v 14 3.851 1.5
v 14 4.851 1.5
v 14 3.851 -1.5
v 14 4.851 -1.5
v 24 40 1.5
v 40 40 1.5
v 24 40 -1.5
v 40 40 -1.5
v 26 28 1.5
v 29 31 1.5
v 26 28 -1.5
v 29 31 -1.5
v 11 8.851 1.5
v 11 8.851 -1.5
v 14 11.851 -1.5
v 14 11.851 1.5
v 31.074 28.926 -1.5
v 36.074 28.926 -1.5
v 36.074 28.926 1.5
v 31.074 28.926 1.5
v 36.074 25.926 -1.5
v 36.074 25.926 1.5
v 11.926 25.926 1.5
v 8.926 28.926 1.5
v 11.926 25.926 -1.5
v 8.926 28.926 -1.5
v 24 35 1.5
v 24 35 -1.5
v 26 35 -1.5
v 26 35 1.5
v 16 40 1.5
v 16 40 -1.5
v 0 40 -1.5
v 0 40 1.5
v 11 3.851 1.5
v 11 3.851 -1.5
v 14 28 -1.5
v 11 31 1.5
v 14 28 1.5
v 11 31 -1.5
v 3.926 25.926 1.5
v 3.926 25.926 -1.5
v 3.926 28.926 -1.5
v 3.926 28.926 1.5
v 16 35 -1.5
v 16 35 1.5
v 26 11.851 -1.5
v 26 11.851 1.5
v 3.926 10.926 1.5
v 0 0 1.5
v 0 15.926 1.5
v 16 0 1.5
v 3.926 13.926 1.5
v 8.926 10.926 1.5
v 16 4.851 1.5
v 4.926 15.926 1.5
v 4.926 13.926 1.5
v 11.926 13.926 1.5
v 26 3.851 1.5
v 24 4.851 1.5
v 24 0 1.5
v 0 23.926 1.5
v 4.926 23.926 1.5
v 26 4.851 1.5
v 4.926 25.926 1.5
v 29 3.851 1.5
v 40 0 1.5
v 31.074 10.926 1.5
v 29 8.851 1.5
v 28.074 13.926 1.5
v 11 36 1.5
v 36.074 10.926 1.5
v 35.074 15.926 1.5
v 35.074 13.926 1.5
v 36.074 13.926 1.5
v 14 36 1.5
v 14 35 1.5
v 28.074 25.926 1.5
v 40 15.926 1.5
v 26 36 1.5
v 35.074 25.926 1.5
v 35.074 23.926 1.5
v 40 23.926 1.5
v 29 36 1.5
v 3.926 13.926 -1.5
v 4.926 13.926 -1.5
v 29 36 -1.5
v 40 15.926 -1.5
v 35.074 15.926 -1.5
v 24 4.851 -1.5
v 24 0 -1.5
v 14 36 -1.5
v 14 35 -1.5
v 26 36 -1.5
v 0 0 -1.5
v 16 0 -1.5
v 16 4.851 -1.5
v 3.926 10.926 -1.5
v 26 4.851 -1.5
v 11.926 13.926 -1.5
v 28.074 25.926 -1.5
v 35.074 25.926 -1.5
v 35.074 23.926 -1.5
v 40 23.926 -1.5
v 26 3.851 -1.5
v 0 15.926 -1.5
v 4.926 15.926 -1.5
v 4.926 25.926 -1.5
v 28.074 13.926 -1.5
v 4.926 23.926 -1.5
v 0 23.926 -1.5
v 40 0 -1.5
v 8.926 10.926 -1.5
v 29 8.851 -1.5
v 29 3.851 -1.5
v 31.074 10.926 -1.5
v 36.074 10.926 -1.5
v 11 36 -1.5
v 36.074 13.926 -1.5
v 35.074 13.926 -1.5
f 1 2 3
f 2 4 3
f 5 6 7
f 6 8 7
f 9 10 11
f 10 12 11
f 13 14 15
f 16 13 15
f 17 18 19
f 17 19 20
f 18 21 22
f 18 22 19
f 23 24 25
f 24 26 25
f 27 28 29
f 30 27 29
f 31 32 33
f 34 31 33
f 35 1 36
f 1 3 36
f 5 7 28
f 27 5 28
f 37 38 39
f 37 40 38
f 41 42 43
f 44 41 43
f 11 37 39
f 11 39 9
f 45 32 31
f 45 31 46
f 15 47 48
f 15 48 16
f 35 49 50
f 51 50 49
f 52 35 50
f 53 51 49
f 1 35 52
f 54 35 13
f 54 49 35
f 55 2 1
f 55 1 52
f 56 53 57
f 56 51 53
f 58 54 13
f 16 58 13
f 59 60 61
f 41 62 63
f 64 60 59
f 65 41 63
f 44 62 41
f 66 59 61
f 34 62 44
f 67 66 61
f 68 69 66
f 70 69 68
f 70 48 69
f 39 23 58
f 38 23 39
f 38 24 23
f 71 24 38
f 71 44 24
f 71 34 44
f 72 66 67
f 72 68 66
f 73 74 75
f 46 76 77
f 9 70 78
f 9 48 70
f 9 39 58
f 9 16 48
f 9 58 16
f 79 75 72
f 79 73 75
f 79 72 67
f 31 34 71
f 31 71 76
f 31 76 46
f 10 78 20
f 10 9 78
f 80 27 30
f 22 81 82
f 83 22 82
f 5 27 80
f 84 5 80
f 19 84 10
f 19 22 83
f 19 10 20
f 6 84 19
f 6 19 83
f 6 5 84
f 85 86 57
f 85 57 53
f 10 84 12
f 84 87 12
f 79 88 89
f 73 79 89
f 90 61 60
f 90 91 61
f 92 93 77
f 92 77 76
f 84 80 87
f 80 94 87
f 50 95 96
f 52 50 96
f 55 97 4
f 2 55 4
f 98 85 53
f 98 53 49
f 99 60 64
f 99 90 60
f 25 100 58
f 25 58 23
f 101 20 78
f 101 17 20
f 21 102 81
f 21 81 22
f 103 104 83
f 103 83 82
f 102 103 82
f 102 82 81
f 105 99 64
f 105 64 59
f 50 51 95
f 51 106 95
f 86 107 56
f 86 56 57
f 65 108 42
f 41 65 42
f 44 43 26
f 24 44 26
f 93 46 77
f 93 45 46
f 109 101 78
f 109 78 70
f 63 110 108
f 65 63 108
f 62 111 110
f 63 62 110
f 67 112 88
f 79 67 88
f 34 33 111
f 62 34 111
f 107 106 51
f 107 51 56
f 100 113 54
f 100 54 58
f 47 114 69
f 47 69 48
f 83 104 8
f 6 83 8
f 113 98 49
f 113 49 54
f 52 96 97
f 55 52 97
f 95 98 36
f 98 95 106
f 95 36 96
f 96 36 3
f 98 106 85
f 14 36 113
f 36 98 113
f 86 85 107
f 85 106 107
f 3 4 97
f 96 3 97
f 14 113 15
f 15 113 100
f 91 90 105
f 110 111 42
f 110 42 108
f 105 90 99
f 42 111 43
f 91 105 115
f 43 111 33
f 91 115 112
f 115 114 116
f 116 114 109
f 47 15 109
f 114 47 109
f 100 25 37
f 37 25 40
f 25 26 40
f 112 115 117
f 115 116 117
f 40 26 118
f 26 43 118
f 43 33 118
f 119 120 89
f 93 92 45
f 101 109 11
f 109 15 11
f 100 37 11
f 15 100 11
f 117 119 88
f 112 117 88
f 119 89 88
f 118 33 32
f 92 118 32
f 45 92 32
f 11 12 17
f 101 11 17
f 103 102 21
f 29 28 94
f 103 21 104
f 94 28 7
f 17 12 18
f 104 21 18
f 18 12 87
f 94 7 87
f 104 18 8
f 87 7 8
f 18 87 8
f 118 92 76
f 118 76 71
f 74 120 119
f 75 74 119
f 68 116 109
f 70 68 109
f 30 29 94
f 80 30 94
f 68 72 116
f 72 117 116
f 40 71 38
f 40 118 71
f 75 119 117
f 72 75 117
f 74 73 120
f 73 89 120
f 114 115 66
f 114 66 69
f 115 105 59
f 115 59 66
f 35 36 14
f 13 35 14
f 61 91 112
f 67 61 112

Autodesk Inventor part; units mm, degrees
ref_plane "YZ Plane" through (0, 0, 0) normal (1, 0, 0) x (0, 1, 0)
ref_plane "XZ Plane" through (0, 0, 0) normal (0, 1, 0) x (-1, 0, 0)
ref_plane "XY Plane" through (0, 0, 0) normal (0, 0, 1) x (1, 0, 0)
sketch "스케치1" plane through (0, 0, 0) normal (0, 0, 1) x (1, 0, 0)
  line L0 (40, 40) -> (25, 40)
  line L1 (15, 40) -> (0, 40)
  line L2 (16, 40) -> (16, 35)
  line L3 (16, 35) -> (14, 35)
  line L4 (14, 35) -> (14, 36)
  line L5 (14, 36) -> (11, 36)
  line L6 (11, 36) -> (11, 31)
  line L7 (11, 31) -> (14, 28)
  line L8 (11, 31) -> (20.81, 31) construction
  line L9 (14, 28) -> (20, 28)
  line L10 (24, 40) -> (24, 35)
  line L11 (24, 35) -> (26, 35)
  line L12 (26, 35) -> (26, 36)
  line L13 (26, 36) -> (29, 36)
  line L14 (29, 36) -> (29, 31)
  line L15 (29, 31) -> (26, 28)
  line L16 (29, 31) -> (19.19, 31) construction
  line L17 (26, 28) -> (20, 28)
  line L18 (-0.0744, 15.9256) -> (4.9256, 15.9256)
  line L19 (-0.0744, 23.9256) -> (4.9256, 23.9256)
  line L20 (4.9256, 23.9256) -> (4.9256, 25.9256)
  line L21 (11.9256, 25.9256) -> (11.9256, 19.9256)
  line L22 (8.9256, 28.9256) -> (8.9256, 19.1155) construction
  line L23 (8.9256, 28.9256) -> (11.9256, 25.9256)
  line L24 (3.9256, 28.9256) -> (8.9256, 28.9256)
  line L25 (3.9256, 25.9256) -> (3.9256, 28.9256)
  line L26 (4.9256, 25.9256) -> (3.9256, 25.9256)
  line L27 (4.9256, 15.9256) -> (4.9256, 13.9256)
  line L28 (11.9256, 13.9256) -> (11.9256, 19.9256)
  line L29 (4.9256, 13.9256) -> (3.9256, 13.9256)
  line L30 (8.9256, 10.9256) -> (11.9256, 13.9256)
  line L31 (8.9256, 10.9256) -> (8.9256, 20.7356) construction
  line L32 (3.9256, 13.9256) -> (3.9256, 10.9256)
  line L33 (3.9256, 10.9256) -> (8.9256, 10.9256)
  line L34 (24, -0.1488) -> (24, 4.8512)
  line L35 (16, -0.1488) -> (16, 4.8512)
  line L36 (16, 4.8512) -> (14, 4.8512)
  line L37 (14, 11.8512) -> (20, 11.8512)
  line L38 (11, 8.8512) -> (20.81, 8.8512) construction
  line L39 (11, 8.8512) -> (14, 11.8512)
  line L40 (11, 3.8512) -> (11, 8.8512)
  line L41 (14, 3.8512) -> (11, 3.8512)
  line L42 (14, 4.8512) -> (14, 3.8512)
  line L43 (24, 4.8512) -> (26, 4.8512)
  line L44 (26, 11.8512) -> (20, 11.8512)
  line L45 (26, 4.8512) -> (26, 3.8512)
  line L46 (29, 8.8512) -> (26, 11.8512)
  line L47 (29, 8.8512) -> (19.19, 8.8512) construction
  line L48 (26, 3.8512) -> (29, 3.8512)
  line L49 (29, 3.8512) -> (29, 8.8512)
  line L50 (40.0744, 23.9256) -> (35.0744, 23.9256)
  line L51 (40.0744, 15.9256) -> (35.0744, 15.9256)
  line L52 (35.0744, 15.9256) -> (35.0744, 13.9256)
  line L53 (28.0744, 13.9256) -> (28.0744, 19.9256)
  line L54 (31.0744, 10.9256) -> (31.0744, 20.7356) construction
  line L55 (31.0744, 10.9256) -> (28.0744, 13.9256)
  line L56 (36.0744, 10.9256) -> (31.0744, 10.9256)
  line L57 (36.0744, 13.9256) -> (36.0744, 10.9256)
  line L58 (35.0744, 13.9256) -> (36.0744, 13.9256)
  line L59 (35.0744, 23.9256) -> (35.0744, 25.9256)
  line L60 (28.0744, 25.9256) -> (28.0744, 19.9256)
  line L61 (35.0744, 25.9256) -> (36.0744, 25.9256)
  line L62 (31.0744, 28.9256) -> (28.0744, 25.9256)
  line L63 (31.0744, 28.9256) -> (31.0744, 19.1155) construction
  line L64 (36.0744, 25.9256) -> (36.0744, 28.9256)
  line L65 (36.0744, 28.9256) -> (31.0744, 28.9256)
  line L66 (11, 20) -> (11.9256, 20)
  line L67 (28.0744, 20) -> (29, 20)
  line L68 (20, 3.8512) -> (20, 4.8512)
  line L69 (20, 35) -> (20, 36)
  line L70 (15, 40) -> (16, 40)
  line L71 (24, 40) -> (25, 40)
  line L72 (0, 40) -> (0, 23.9256)
  line L73 (0, 15.9256) -> (0, 0)
  line L74 (40, 0) -> (40, 15.9256)
  line L75 (40, 23.9256) -> (40, 40)
  line L76 (0, 0) -> (16, 0)
  line L77 (24, 0) -> (40, 0)
  point P0 (25, 38)
  point P1 (20, 19.9256)
  point P2 (15, 35)
  point P3 (25, 35)
  point P4 (4.9256, 24.9256)
  point P5 (4.9256, 14.9256)
  point P6 (15, 4.8512)
  point P7 (25, 4.8512)
  point P8 (35.0744, 14.9256)
  point P9 (35.0744, 24.9256)
  dimension "d0" = 40
  dimension "d1" = 40
  dimension "d14" = 2
  dimension "d15" = 5
  dimension "d16" = 1
  dimension "d17" = 3
  dimension "d18" = 5
  dimension "d19" = 45
  dimension "d21" = 7
  dimension "d24" = 360
extrude "돌출1" add sketch "스케치1" along normal mid plane 3
properties part number "79" material "철, 회색"
